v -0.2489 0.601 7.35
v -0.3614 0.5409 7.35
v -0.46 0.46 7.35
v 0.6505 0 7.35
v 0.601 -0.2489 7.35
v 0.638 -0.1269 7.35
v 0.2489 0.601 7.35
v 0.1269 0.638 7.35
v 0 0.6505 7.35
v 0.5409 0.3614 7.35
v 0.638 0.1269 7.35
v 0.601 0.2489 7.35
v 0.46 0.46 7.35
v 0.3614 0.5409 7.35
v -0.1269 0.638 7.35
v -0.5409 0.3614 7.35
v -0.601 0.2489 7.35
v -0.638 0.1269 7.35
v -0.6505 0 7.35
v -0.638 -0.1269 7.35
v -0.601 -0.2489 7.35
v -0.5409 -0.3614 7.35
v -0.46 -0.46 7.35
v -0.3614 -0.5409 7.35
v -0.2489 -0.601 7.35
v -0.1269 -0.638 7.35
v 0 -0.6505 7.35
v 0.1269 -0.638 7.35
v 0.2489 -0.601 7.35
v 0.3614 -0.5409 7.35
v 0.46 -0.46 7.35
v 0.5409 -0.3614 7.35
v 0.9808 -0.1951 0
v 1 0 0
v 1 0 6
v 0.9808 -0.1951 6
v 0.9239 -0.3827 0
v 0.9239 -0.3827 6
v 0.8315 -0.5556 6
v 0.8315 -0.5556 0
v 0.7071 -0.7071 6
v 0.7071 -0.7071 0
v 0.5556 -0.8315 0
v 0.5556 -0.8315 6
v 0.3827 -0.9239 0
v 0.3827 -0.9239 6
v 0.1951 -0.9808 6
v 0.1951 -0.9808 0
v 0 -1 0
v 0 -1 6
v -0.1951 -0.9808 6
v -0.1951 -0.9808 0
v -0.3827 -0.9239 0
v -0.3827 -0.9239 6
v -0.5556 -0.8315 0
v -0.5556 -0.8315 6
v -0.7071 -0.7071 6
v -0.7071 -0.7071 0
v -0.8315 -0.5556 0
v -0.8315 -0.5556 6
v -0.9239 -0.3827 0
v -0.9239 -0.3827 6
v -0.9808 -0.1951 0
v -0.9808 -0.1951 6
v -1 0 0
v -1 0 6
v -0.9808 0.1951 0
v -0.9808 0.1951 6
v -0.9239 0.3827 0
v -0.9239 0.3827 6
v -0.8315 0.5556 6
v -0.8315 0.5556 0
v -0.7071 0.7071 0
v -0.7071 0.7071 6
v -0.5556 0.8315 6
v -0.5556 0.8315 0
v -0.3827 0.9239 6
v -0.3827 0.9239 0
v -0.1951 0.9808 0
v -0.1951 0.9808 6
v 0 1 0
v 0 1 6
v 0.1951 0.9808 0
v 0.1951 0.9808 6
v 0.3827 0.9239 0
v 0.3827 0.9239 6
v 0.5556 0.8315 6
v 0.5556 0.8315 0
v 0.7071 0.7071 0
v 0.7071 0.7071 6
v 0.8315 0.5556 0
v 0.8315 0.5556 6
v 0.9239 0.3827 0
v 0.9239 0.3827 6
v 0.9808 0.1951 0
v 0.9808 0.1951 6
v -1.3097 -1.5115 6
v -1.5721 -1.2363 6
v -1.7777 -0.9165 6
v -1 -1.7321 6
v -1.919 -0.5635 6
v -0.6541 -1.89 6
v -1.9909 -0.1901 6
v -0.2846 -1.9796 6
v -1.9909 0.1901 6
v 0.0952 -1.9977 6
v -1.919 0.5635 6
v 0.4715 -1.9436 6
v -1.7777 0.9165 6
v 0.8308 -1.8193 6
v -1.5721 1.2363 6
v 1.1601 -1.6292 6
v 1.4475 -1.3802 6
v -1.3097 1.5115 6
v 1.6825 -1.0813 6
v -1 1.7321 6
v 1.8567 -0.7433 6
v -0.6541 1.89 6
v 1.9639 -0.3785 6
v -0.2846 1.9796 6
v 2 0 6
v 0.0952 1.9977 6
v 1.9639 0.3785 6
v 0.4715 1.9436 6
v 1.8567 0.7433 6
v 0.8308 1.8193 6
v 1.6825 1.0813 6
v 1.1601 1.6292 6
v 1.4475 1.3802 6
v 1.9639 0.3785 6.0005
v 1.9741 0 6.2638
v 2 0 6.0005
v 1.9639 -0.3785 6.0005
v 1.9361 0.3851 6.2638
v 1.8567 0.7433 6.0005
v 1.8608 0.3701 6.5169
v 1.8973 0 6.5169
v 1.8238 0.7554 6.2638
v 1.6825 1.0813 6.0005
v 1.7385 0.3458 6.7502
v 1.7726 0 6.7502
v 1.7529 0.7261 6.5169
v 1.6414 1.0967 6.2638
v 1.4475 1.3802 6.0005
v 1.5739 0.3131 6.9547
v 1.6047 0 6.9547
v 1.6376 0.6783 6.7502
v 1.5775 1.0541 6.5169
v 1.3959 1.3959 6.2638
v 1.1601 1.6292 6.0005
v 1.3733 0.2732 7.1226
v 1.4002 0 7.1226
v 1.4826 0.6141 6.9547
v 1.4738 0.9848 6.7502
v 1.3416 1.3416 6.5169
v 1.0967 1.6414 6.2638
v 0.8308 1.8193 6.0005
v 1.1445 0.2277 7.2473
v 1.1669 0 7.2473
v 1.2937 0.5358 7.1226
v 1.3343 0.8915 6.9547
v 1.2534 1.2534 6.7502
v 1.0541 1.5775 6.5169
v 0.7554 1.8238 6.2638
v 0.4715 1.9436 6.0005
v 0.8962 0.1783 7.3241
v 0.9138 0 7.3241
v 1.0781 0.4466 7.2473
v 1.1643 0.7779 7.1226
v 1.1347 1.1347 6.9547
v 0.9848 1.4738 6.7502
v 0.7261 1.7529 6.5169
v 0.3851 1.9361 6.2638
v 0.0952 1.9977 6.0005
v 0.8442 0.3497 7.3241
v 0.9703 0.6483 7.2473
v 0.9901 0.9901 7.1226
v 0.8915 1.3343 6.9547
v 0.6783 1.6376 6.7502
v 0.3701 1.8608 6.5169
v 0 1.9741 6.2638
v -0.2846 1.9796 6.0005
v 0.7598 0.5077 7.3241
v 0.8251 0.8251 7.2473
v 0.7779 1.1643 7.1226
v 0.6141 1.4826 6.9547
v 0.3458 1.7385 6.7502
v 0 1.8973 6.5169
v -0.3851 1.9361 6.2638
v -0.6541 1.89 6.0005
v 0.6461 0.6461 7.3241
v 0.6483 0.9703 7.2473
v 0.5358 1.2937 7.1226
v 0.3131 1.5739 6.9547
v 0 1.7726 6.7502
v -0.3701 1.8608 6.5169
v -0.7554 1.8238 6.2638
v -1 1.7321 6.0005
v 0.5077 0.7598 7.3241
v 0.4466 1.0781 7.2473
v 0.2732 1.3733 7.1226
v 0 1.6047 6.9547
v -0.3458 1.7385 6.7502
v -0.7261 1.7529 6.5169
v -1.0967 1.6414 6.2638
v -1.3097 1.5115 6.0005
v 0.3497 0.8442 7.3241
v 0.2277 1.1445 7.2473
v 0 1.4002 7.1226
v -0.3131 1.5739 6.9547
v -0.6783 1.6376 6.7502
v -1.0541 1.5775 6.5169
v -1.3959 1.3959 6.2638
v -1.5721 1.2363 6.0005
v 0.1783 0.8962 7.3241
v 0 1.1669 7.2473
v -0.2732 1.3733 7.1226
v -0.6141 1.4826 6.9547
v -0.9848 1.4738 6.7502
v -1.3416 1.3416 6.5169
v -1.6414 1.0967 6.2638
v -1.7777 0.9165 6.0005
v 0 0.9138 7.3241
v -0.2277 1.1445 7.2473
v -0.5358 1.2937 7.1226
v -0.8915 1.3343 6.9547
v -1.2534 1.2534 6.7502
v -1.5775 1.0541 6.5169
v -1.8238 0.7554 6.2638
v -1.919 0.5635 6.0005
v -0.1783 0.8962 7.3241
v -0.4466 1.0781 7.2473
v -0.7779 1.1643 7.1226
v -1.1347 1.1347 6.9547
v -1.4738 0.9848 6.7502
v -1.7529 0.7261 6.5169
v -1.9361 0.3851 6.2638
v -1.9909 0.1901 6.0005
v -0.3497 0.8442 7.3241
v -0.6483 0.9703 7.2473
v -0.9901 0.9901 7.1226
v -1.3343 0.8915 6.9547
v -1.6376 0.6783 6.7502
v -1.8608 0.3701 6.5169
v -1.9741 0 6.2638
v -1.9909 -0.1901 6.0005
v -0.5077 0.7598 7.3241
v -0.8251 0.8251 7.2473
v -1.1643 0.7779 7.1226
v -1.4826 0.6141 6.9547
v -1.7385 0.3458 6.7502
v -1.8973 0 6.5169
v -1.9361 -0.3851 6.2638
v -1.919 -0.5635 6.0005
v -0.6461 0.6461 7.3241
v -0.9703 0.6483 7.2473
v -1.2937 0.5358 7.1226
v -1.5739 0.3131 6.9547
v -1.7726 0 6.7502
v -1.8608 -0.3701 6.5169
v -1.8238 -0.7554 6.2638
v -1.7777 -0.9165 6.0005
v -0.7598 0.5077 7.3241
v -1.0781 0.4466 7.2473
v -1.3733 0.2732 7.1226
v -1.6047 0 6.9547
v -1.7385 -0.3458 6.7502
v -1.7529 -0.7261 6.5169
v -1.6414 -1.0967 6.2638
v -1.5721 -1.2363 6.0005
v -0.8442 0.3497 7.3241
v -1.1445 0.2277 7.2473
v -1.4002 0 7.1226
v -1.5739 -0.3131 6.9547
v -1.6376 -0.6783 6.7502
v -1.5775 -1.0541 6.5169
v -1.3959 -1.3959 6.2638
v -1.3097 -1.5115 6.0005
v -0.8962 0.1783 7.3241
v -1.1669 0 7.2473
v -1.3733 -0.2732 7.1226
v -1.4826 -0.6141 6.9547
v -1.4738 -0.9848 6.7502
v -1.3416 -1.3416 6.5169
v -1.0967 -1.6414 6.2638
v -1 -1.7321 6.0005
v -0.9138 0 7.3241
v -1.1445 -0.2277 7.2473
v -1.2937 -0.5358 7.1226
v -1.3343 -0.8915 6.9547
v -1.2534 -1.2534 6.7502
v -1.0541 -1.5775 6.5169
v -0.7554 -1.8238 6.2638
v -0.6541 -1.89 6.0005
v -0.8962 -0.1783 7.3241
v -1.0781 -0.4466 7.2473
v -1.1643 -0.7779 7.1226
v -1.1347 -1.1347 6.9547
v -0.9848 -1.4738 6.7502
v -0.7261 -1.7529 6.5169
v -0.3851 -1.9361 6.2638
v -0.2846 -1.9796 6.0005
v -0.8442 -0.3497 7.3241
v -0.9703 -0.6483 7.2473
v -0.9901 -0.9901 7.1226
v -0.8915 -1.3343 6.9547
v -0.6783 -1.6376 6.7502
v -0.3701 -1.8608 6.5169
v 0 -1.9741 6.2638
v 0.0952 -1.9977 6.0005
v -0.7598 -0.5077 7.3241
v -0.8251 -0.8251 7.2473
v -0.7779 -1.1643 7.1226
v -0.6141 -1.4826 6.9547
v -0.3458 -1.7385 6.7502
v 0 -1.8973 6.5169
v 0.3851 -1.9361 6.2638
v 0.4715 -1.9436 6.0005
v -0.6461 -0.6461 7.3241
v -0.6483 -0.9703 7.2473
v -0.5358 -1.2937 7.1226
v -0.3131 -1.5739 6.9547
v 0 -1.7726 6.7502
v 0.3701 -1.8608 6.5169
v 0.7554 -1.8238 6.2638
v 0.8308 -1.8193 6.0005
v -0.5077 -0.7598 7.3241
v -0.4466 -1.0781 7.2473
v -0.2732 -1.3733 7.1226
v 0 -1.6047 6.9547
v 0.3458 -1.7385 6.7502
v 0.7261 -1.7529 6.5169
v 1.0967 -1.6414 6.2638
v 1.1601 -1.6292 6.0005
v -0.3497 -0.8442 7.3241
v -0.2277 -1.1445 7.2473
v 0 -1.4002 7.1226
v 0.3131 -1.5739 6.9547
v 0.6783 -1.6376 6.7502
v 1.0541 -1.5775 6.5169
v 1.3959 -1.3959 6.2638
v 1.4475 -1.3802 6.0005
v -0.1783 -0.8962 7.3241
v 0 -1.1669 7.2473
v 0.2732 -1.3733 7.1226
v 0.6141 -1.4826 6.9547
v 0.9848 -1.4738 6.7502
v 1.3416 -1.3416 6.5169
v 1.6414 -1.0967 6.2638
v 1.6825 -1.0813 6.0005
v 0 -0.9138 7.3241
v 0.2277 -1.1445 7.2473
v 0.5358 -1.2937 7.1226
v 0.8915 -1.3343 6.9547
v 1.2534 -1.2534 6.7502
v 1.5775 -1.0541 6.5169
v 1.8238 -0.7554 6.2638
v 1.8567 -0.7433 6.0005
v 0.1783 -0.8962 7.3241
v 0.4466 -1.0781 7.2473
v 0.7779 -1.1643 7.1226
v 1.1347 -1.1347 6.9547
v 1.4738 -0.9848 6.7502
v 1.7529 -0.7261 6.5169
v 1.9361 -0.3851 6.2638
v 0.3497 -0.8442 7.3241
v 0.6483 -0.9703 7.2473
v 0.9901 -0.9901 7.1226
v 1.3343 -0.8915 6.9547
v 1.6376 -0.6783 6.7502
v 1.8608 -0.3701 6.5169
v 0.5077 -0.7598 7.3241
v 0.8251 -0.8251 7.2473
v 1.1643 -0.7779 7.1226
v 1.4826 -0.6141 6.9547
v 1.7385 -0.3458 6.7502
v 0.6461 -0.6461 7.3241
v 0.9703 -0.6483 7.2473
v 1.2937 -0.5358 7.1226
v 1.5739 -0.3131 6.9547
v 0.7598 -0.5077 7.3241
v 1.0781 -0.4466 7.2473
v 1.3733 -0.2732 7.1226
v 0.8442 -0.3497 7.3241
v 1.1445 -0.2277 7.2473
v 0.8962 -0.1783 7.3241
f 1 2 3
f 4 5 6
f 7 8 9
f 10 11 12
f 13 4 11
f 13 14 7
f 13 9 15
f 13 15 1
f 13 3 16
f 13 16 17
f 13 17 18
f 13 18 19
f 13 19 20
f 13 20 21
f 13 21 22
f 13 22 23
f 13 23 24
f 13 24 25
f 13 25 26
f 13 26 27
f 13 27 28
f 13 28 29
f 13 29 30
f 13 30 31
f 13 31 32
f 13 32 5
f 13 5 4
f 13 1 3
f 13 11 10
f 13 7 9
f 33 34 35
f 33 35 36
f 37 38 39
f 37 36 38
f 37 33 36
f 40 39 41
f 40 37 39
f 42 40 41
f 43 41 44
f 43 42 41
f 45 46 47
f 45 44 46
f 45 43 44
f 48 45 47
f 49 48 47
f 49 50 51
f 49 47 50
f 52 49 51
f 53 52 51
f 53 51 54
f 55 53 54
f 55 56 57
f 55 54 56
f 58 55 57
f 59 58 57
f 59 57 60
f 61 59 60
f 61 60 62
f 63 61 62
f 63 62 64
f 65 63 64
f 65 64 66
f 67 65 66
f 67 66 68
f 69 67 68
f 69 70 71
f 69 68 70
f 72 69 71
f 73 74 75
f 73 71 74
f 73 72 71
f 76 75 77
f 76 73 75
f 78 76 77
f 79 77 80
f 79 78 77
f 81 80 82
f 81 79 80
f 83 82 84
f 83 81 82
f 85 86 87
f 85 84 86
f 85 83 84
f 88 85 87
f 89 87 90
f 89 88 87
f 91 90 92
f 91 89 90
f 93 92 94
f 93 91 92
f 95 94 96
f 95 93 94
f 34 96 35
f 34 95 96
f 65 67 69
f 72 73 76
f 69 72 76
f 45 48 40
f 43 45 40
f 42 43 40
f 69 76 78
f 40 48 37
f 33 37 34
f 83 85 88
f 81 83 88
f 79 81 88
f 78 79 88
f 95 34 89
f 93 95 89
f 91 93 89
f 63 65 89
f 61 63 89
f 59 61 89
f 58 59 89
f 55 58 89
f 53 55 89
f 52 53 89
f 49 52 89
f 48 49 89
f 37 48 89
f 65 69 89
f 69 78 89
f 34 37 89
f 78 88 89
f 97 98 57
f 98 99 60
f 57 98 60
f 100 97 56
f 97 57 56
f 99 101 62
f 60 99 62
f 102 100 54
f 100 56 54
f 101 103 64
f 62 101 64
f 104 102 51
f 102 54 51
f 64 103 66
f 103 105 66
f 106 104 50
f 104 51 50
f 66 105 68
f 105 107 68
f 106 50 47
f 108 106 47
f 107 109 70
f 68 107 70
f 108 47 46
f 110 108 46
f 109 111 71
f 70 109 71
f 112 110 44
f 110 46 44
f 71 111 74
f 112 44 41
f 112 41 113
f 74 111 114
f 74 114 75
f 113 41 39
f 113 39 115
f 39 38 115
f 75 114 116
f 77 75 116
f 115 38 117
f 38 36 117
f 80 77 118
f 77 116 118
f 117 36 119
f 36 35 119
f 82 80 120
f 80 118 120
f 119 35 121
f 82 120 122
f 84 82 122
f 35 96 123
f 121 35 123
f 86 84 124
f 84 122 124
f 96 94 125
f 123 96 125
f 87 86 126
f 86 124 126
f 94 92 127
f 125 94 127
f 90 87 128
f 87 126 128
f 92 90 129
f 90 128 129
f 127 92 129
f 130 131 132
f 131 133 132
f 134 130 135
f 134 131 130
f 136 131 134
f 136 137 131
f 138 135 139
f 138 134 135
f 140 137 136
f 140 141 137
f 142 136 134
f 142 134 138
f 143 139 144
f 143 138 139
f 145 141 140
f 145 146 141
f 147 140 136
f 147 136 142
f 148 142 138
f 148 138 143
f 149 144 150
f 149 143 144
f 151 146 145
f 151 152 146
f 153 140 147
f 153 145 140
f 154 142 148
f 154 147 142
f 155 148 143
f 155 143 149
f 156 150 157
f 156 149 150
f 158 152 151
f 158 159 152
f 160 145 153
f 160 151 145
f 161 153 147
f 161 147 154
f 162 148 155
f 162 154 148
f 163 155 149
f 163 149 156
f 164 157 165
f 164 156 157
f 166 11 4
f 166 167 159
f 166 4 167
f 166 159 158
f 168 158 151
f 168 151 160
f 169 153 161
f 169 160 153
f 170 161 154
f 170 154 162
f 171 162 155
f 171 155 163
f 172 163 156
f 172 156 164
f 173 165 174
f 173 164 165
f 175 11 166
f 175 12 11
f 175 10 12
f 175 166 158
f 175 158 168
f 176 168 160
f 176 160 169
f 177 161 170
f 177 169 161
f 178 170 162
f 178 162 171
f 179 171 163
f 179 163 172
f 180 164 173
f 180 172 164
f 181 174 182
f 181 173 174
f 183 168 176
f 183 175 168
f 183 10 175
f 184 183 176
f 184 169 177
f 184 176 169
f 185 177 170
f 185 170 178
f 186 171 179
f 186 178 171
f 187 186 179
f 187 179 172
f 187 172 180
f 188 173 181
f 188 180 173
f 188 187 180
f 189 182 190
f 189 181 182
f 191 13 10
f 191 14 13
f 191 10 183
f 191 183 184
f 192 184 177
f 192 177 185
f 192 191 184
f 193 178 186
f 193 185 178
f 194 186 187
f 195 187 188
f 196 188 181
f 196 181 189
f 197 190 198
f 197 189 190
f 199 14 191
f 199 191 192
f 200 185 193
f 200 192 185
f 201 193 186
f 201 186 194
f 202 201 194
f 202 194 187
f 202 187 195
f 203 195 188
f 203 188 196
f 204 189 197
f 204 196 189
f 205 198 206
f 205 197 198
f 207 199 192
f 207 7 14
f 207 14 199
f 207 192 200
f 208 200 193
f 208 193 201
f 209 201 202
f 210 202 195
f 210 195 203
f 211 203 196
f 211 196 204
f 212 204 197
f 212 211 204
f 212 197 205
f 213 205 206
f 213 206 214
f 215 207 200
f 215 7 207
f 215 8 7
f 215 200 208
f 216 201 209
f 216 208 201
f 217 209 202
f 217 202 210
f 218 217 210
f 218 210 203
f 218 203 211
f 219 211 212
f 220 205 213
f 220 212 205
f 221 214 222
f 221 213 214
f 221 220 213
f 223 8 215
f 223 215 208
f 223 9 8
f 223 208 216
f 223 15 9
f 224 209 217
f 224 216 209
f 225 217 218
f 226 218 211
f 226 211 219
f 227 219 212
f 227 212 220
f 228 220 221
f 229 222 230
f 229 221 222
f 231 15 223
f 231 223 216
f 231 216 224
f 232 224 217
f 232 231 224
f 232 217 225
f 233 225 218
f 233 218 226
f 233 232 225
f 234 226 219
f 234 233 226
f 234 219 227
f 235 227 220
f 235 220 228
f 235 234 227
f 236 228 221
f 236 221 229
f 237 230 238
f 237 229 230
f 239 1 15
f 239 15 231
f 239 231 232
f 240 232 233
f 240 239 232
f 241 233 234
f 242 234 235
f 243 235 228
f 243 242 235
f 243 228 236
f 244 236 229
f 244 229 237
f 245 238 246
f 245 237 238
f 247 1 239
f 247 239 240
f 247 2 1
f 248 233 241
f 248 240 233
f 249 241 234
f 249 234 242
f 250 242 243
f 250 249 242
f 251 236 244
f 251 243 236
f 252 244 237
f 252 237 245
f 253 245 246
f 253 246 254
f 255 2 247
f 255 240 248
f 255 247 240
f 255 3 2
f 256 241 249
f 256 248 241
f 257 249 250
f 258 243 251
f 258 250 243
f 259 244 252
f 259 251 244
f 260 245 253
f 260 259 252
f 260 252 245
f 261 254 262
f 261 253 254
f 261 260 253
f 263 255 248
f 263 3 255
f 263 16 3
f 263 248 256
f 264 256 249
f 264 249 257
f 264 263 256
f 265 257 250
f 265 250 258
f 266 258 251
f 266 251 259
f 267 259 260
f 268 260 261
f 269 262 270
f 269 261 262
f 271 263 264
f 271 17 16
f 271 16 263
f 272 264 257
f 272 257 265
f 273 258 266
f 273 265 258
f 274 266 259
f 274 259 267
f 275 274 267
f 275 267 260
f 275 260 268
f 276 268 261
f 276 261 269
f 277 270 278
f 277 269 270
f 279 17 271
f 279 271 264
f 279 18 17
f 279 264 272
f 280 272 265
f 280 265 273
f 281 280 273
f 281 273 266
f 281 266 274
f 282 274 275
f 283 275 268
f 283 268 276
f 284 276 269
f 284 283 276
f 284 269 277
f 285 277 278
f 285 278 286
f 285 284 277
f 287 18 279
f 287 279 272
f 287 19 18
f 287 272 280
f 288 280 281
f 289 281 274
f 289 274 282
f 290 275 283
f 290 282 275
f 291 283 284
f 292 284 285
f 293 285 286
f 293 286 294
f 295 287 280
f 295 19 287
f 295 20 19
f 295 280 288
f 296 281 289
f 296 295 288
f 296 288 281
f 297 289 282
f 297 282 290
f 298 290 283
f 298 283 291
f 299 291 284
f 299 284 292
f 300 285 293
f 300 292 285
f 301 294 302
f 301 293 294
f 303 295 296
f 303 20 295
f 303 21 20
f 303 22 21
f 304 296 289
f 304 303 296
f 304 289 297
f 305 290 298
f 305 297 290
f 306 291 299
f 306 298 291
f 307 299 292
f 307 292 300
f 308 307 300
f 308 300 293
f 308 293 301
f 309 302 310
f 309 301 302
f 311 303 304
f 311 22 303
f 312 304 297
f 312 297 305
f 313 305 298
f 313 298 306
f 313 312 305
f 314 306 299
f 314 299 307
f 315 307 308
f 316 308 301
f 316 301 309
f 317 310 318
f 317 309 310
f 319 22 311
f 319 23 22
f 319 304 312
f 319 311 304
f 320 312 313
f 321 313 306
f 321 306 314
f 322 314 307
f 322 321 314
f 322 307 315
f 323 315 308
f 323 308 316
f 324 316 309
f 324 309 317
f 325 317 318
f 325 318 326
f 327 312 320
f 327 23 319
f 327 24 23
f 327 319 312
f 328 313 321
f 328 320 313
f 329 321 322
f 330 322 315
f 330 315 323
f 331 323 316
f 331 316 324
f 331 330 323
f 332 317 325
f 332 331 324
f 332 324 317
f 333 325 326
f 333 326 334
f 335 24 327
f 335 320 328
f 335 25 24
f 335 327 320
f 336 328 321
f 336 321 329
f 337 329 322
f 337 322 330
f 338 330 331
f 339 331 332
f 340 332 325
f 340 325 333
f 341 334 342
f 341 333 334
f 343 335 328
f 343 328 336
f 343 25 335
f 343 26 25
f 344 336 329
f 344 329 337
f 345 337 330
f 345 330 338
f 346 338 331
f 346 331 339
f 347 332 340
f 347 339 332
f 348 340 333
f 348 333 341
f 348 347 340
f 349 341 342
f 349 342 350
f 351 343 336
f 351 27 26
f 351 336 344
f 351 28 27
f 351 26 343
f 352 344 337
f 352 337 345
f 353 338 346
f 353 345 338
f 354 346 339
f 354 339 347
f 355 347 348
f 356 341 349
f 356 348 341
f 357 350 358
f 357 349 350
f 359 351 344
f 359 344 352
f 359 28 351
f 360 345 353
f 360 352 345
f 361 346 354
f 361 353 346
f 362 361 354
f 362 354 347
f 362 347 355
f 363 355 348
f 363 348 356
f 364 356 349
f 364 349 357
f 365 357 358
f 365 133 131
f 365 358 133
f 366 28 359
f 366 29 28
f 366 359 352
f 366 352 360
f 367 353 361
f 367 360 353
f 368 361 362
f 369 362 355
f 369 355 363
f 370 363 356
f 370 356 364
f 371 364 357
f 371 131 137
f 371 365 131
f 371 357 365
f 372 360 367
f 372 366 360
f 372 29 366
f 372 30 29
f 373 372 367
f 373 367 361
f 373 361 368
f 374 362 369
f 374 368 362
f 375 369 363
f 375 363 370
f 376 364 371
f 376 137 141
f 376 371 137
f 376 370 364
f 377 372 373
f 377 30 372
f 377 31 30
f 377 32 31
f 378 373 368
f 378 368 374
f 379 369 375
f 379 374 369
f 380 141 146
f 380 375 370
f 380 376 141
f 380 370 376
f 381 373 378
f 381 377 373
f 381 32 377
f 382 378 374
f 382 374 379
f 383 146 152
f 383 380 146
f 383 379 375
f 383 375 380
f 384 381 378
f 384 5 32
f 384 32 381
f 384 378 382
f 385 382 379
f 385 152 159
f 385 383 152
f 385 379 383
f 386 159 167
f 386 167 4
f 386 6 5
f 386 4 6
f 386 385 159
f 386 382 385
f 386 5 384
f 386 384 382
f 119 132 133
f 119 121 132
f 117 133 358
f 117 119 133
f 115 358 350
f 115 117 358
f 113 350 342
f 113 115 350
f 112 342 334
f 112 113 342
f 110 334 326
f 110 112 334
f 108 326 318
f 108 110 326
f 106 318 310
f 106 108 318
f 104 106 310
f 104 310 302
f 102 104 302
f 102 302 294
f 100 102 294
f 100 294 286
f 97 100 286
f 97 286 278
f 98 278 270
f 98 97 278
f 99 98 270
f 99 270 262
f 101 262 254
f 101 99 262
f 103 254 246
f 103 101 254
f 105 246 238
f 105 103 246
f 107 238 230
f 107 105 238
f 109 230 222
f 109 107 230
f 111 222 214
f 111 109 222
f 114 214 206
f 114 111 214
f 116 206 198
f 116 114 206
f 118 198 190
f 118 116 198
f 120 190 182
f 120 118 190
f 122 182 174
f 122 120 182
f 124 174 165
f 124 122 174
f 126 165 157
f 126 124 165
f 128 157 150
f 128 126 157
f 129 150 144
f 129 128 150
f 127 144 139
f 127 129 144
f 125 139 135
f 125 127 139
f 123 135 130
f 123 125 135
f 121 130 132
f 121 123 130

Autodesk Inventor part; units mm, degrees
ref_plane "YZ Plane" through (0, 0, 0) normal (1, 0, 0) x (0, 1, 0)
ref_plane "XZ Plane" through (0, 0, 0) normal (0, 1, 0) x (-1, 0, 0)
ref_plane "XY Plane" through (0, 0, 0) normal (0, 0, 1) x (1, 0, 0)
sketch "スケッチ1" plane through (0, 0, 0) normal (0, 0, 1) x (1, 0, 0)
  circle A0 centre (0, 0) radius 1
  dimension "d0" = 2
extrude "押し出し1" add sketch "スケッチ1" along normal blind 6
sketch "スケッチ2" plane through (0, 0, 6) normal (0, 0, 1) x (1, 0, 0)
  circle A0 centre (0, 0) radius 1 projected
  circle A1 centre (0, 0) radius 2
  dimension "d3" = 4
extrude "押し出し2" add sketch "スケッチ2" along normal blind 1.35 contours A0 | A1
fillet "フィレット1" radius 1.35 1 edges at (-2, 0, 7.35)
thread "ねじ1" size "M3x0.5" class "6g" standard "ANSI Metric M Profile" full length
sketch "スケッチ3" plane through (0, 0, 0) normal (0, 0, -1) x (-1, 0, 0)
  circle A0 centre (0, 0) radius 1 projected
properties part number "SB　M2 6mmなべネジ" material "Steel, Mild"
